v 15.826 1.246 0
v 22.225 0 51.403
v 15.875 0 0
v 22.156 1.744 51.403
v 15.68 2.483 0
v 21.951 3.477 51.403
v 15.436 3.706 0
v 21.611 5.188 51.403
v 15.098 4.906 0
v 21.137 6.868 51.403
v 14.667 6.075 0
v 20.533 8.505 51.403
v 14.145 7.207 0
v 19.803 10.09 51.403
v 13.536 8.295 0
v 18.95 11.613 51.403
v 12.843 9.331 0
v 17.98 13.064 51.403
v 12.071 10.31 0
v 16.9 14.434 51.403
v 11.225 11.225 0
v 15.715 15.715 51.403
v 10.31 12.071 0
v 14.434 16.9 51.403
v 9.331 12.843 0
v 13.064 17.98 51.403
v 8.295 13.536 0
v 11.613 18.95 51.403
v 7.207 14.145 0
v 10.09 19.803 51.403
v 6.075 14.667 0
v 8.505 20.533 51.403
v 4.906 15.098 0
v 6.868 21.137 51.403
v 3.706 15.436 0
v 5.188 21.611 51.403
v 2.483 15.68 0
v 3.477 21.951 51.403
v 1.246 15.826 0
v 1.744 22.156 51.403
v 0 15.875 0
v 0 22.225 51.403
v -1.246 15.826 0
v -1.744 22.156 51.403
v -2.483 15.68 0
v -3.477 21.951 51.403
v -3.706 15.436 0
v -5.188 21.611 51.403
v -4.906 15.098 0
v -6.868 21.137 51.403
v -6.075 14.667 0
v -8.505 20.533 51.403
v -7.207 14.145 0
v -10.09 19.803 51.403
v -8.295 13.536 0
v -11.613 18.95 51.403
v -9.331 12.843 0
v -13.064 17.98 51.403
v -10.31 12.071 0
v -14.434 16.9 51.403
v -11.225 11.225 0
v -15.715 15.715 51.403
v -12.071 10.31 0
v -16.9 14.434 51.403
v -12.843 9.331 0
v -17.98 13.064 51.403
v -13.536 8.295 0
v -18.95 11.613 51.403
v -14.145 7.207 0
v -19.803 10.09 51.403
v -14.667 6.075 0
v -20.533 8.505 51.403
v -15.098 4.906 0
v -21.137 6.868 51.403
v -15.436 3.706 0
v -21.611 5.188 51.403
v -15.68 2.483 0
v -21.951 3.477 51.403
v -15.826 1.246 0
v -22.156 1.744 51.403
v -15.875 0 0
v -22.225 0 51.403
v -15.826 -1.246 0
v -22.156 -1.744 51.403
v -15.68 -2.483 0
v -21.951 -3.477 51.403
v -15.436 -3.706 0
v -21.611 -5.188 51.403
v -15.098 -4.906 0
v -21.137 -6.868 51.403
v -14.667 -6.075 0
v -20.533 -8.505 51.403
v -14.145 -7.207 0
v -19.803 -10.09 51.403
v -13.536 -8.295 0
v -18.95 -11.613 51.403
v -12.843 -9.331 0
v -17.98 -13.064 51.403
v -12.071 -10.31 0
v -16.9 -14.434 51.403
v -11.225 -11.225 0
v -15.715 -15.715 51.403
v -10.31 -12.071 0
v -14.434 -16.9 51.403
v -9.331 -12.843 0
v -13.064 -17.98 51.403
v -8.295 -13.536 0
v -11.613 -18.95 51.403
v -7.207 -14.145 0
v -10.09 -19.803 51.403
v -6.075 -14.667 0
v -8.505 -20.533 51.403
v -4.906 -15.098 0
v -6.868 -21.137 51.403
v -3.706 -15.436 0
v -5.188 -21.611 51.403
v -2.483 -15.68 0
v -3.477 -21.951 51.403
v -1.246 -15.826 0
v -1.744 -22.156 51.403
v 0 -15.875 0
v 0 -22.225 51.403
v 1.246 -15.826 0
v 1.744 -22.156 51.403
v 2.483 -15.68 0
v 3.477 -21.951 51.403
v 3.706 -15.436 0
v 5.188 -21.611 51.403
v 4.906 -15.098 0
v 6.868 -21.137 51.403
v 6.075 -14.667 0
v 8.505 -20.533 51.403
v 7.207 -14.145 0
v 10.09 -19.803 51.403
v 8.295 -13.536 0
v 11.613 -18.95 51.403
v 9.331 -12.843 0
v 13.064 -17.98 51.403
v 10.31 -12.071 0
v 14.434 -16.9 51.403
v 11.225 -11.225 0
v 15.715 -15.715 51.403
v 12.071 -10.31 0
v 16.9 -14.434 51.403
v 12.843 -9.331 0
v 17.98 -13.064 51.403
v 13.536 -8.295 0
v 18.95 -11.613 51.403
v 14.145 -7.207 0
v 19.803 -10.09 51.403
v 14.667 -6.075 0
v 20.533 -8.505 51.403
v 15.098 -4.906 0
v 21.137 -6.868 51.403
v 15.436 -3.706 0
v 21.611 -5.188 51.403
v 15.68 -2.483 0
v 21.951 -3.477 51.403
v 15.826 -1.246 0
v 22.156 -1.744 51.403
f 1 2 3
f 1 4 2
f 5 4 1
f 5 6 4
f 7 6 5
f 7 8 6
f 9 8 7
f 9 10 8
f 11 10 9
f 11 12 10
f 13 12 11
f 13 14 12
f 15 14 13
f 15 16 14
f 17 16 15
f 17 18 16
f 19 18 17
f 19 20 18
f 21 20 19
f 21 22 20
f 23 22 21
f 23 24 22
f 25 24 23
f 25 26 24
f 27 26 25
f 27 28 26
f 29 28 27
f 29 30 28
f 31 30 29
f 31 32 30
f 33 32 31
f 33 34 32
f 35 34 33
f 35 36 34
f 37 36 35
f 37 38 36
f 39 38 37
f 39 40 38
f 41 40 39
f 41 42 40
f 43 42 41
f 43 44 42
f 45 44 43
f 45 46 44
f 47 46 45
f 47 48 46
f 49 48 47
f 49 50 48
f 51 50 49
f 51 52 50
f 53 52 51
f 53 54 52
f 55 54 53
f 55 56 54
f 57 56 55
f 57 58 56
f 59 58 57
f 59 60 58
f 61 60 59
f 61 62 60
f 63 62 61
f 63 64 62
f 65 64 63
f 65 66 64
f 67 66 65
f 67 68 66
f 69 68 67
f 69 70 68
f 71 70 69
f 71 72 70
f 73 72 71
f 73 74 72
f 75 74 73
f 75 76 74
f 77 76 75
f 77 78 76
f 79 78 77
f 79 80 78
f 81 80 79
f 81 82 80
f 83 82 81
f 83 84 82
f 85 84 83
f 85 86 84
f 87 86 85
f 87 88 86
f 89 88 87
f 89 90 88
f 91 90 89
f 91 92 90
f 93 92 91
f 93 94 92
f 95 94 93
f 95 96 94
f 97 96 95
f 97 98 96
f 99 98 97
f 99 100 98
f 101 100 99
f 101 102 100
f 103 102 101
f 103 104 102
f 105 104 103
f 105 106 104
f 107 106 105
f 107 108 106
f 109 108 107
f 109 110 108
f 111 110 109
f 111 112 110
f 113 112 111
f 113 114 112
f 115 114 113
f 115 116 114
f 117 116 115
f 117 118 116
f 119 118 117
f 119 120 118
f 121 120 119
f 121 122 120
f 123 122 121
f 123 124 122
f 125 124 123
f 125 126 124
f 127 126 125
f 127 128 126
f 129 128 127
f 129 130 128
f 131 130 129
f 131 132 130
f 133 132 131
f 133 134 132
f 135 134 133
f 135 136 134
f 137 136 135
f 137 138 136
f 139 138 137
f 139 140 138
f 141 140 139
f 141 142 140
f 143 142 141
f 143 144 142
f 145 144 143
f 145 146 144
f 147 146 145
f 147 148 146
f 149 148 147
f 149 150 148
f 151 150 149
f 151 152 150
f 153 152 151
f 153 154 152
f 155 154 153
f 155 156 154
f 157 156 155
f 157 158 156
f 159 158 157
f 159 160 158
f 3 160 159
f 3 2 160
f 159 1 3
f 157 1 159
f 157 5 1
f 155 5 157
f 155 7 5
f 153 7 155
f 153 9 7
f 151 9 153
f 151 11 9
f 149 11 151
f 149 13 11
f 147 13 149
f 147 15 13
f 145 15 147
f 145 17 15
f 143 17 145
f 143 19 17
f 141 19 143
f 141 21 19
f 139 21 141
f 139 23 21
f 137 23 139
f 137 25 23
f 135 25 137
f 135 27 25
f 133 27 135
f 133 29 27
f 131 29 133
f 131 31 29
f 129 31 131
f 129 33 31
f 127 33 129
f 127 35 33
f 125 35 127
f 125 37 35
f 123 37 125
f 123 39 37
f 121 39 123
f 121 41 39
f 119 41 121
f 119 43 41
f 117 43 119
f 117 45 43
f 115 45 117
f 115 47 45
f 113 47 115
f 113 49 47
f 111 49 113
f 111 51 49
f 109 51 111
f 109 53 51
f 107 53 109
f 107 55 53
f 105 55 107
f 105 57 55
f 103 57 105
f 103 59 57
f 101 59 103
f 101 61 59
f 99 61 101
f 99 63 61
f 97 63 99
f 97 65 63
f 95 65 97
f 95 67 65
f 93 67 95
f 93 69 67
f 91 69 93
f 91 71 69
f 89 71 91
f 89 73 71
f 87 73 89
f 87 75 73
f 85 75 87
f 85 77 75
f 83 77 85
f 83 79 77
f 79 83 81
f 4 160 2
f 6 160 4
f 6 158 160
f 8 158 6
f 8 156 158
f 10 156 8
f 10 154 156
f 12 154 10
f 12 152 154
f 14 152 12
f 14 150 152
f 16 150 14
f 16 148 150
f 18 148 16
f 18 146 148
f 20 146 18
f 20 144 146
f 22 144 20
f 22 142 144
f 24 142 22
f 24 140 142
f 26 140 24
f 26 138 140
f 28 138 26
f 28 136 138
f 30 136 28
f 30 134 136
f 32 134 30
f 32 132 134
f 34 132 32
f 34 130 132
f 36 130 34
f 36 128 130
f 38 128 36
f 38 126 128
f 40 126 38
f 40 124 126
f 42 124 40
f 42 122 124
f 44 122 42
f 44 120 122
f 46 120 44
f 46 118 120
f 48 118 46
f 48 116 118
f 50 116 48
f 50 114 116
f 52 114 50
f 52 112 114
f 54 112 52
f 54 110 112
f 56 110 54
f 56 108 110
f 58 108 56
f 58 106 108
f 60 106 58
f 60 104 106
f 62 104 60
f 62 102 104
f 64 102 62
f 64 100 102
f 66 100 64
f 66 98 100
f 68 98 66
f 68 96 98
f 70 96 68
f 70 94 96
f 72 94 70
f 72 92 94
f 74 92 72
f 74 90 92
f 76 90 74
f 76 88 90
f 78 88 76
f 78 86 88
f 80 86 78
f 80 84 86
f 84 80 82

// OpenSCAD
inch=25.4;

ounces=2;


ml=ounces*29.5735;

eleventh=ml/11;

void_top_width=1.75*inch;
void_bottom_width=1.25*inch;

top_clearance=0.25*inch;


r1=void_bottom_width/2;
r2=void_top_width/2;

void_height=(1000*ml)/(1/3*PI*(pow(r1,2)+pow(r2,2)+r1*r2));

echo(void_height);

cylinder(void_height,void_bottom_width/2,void_top_width/2,$fn=80);
